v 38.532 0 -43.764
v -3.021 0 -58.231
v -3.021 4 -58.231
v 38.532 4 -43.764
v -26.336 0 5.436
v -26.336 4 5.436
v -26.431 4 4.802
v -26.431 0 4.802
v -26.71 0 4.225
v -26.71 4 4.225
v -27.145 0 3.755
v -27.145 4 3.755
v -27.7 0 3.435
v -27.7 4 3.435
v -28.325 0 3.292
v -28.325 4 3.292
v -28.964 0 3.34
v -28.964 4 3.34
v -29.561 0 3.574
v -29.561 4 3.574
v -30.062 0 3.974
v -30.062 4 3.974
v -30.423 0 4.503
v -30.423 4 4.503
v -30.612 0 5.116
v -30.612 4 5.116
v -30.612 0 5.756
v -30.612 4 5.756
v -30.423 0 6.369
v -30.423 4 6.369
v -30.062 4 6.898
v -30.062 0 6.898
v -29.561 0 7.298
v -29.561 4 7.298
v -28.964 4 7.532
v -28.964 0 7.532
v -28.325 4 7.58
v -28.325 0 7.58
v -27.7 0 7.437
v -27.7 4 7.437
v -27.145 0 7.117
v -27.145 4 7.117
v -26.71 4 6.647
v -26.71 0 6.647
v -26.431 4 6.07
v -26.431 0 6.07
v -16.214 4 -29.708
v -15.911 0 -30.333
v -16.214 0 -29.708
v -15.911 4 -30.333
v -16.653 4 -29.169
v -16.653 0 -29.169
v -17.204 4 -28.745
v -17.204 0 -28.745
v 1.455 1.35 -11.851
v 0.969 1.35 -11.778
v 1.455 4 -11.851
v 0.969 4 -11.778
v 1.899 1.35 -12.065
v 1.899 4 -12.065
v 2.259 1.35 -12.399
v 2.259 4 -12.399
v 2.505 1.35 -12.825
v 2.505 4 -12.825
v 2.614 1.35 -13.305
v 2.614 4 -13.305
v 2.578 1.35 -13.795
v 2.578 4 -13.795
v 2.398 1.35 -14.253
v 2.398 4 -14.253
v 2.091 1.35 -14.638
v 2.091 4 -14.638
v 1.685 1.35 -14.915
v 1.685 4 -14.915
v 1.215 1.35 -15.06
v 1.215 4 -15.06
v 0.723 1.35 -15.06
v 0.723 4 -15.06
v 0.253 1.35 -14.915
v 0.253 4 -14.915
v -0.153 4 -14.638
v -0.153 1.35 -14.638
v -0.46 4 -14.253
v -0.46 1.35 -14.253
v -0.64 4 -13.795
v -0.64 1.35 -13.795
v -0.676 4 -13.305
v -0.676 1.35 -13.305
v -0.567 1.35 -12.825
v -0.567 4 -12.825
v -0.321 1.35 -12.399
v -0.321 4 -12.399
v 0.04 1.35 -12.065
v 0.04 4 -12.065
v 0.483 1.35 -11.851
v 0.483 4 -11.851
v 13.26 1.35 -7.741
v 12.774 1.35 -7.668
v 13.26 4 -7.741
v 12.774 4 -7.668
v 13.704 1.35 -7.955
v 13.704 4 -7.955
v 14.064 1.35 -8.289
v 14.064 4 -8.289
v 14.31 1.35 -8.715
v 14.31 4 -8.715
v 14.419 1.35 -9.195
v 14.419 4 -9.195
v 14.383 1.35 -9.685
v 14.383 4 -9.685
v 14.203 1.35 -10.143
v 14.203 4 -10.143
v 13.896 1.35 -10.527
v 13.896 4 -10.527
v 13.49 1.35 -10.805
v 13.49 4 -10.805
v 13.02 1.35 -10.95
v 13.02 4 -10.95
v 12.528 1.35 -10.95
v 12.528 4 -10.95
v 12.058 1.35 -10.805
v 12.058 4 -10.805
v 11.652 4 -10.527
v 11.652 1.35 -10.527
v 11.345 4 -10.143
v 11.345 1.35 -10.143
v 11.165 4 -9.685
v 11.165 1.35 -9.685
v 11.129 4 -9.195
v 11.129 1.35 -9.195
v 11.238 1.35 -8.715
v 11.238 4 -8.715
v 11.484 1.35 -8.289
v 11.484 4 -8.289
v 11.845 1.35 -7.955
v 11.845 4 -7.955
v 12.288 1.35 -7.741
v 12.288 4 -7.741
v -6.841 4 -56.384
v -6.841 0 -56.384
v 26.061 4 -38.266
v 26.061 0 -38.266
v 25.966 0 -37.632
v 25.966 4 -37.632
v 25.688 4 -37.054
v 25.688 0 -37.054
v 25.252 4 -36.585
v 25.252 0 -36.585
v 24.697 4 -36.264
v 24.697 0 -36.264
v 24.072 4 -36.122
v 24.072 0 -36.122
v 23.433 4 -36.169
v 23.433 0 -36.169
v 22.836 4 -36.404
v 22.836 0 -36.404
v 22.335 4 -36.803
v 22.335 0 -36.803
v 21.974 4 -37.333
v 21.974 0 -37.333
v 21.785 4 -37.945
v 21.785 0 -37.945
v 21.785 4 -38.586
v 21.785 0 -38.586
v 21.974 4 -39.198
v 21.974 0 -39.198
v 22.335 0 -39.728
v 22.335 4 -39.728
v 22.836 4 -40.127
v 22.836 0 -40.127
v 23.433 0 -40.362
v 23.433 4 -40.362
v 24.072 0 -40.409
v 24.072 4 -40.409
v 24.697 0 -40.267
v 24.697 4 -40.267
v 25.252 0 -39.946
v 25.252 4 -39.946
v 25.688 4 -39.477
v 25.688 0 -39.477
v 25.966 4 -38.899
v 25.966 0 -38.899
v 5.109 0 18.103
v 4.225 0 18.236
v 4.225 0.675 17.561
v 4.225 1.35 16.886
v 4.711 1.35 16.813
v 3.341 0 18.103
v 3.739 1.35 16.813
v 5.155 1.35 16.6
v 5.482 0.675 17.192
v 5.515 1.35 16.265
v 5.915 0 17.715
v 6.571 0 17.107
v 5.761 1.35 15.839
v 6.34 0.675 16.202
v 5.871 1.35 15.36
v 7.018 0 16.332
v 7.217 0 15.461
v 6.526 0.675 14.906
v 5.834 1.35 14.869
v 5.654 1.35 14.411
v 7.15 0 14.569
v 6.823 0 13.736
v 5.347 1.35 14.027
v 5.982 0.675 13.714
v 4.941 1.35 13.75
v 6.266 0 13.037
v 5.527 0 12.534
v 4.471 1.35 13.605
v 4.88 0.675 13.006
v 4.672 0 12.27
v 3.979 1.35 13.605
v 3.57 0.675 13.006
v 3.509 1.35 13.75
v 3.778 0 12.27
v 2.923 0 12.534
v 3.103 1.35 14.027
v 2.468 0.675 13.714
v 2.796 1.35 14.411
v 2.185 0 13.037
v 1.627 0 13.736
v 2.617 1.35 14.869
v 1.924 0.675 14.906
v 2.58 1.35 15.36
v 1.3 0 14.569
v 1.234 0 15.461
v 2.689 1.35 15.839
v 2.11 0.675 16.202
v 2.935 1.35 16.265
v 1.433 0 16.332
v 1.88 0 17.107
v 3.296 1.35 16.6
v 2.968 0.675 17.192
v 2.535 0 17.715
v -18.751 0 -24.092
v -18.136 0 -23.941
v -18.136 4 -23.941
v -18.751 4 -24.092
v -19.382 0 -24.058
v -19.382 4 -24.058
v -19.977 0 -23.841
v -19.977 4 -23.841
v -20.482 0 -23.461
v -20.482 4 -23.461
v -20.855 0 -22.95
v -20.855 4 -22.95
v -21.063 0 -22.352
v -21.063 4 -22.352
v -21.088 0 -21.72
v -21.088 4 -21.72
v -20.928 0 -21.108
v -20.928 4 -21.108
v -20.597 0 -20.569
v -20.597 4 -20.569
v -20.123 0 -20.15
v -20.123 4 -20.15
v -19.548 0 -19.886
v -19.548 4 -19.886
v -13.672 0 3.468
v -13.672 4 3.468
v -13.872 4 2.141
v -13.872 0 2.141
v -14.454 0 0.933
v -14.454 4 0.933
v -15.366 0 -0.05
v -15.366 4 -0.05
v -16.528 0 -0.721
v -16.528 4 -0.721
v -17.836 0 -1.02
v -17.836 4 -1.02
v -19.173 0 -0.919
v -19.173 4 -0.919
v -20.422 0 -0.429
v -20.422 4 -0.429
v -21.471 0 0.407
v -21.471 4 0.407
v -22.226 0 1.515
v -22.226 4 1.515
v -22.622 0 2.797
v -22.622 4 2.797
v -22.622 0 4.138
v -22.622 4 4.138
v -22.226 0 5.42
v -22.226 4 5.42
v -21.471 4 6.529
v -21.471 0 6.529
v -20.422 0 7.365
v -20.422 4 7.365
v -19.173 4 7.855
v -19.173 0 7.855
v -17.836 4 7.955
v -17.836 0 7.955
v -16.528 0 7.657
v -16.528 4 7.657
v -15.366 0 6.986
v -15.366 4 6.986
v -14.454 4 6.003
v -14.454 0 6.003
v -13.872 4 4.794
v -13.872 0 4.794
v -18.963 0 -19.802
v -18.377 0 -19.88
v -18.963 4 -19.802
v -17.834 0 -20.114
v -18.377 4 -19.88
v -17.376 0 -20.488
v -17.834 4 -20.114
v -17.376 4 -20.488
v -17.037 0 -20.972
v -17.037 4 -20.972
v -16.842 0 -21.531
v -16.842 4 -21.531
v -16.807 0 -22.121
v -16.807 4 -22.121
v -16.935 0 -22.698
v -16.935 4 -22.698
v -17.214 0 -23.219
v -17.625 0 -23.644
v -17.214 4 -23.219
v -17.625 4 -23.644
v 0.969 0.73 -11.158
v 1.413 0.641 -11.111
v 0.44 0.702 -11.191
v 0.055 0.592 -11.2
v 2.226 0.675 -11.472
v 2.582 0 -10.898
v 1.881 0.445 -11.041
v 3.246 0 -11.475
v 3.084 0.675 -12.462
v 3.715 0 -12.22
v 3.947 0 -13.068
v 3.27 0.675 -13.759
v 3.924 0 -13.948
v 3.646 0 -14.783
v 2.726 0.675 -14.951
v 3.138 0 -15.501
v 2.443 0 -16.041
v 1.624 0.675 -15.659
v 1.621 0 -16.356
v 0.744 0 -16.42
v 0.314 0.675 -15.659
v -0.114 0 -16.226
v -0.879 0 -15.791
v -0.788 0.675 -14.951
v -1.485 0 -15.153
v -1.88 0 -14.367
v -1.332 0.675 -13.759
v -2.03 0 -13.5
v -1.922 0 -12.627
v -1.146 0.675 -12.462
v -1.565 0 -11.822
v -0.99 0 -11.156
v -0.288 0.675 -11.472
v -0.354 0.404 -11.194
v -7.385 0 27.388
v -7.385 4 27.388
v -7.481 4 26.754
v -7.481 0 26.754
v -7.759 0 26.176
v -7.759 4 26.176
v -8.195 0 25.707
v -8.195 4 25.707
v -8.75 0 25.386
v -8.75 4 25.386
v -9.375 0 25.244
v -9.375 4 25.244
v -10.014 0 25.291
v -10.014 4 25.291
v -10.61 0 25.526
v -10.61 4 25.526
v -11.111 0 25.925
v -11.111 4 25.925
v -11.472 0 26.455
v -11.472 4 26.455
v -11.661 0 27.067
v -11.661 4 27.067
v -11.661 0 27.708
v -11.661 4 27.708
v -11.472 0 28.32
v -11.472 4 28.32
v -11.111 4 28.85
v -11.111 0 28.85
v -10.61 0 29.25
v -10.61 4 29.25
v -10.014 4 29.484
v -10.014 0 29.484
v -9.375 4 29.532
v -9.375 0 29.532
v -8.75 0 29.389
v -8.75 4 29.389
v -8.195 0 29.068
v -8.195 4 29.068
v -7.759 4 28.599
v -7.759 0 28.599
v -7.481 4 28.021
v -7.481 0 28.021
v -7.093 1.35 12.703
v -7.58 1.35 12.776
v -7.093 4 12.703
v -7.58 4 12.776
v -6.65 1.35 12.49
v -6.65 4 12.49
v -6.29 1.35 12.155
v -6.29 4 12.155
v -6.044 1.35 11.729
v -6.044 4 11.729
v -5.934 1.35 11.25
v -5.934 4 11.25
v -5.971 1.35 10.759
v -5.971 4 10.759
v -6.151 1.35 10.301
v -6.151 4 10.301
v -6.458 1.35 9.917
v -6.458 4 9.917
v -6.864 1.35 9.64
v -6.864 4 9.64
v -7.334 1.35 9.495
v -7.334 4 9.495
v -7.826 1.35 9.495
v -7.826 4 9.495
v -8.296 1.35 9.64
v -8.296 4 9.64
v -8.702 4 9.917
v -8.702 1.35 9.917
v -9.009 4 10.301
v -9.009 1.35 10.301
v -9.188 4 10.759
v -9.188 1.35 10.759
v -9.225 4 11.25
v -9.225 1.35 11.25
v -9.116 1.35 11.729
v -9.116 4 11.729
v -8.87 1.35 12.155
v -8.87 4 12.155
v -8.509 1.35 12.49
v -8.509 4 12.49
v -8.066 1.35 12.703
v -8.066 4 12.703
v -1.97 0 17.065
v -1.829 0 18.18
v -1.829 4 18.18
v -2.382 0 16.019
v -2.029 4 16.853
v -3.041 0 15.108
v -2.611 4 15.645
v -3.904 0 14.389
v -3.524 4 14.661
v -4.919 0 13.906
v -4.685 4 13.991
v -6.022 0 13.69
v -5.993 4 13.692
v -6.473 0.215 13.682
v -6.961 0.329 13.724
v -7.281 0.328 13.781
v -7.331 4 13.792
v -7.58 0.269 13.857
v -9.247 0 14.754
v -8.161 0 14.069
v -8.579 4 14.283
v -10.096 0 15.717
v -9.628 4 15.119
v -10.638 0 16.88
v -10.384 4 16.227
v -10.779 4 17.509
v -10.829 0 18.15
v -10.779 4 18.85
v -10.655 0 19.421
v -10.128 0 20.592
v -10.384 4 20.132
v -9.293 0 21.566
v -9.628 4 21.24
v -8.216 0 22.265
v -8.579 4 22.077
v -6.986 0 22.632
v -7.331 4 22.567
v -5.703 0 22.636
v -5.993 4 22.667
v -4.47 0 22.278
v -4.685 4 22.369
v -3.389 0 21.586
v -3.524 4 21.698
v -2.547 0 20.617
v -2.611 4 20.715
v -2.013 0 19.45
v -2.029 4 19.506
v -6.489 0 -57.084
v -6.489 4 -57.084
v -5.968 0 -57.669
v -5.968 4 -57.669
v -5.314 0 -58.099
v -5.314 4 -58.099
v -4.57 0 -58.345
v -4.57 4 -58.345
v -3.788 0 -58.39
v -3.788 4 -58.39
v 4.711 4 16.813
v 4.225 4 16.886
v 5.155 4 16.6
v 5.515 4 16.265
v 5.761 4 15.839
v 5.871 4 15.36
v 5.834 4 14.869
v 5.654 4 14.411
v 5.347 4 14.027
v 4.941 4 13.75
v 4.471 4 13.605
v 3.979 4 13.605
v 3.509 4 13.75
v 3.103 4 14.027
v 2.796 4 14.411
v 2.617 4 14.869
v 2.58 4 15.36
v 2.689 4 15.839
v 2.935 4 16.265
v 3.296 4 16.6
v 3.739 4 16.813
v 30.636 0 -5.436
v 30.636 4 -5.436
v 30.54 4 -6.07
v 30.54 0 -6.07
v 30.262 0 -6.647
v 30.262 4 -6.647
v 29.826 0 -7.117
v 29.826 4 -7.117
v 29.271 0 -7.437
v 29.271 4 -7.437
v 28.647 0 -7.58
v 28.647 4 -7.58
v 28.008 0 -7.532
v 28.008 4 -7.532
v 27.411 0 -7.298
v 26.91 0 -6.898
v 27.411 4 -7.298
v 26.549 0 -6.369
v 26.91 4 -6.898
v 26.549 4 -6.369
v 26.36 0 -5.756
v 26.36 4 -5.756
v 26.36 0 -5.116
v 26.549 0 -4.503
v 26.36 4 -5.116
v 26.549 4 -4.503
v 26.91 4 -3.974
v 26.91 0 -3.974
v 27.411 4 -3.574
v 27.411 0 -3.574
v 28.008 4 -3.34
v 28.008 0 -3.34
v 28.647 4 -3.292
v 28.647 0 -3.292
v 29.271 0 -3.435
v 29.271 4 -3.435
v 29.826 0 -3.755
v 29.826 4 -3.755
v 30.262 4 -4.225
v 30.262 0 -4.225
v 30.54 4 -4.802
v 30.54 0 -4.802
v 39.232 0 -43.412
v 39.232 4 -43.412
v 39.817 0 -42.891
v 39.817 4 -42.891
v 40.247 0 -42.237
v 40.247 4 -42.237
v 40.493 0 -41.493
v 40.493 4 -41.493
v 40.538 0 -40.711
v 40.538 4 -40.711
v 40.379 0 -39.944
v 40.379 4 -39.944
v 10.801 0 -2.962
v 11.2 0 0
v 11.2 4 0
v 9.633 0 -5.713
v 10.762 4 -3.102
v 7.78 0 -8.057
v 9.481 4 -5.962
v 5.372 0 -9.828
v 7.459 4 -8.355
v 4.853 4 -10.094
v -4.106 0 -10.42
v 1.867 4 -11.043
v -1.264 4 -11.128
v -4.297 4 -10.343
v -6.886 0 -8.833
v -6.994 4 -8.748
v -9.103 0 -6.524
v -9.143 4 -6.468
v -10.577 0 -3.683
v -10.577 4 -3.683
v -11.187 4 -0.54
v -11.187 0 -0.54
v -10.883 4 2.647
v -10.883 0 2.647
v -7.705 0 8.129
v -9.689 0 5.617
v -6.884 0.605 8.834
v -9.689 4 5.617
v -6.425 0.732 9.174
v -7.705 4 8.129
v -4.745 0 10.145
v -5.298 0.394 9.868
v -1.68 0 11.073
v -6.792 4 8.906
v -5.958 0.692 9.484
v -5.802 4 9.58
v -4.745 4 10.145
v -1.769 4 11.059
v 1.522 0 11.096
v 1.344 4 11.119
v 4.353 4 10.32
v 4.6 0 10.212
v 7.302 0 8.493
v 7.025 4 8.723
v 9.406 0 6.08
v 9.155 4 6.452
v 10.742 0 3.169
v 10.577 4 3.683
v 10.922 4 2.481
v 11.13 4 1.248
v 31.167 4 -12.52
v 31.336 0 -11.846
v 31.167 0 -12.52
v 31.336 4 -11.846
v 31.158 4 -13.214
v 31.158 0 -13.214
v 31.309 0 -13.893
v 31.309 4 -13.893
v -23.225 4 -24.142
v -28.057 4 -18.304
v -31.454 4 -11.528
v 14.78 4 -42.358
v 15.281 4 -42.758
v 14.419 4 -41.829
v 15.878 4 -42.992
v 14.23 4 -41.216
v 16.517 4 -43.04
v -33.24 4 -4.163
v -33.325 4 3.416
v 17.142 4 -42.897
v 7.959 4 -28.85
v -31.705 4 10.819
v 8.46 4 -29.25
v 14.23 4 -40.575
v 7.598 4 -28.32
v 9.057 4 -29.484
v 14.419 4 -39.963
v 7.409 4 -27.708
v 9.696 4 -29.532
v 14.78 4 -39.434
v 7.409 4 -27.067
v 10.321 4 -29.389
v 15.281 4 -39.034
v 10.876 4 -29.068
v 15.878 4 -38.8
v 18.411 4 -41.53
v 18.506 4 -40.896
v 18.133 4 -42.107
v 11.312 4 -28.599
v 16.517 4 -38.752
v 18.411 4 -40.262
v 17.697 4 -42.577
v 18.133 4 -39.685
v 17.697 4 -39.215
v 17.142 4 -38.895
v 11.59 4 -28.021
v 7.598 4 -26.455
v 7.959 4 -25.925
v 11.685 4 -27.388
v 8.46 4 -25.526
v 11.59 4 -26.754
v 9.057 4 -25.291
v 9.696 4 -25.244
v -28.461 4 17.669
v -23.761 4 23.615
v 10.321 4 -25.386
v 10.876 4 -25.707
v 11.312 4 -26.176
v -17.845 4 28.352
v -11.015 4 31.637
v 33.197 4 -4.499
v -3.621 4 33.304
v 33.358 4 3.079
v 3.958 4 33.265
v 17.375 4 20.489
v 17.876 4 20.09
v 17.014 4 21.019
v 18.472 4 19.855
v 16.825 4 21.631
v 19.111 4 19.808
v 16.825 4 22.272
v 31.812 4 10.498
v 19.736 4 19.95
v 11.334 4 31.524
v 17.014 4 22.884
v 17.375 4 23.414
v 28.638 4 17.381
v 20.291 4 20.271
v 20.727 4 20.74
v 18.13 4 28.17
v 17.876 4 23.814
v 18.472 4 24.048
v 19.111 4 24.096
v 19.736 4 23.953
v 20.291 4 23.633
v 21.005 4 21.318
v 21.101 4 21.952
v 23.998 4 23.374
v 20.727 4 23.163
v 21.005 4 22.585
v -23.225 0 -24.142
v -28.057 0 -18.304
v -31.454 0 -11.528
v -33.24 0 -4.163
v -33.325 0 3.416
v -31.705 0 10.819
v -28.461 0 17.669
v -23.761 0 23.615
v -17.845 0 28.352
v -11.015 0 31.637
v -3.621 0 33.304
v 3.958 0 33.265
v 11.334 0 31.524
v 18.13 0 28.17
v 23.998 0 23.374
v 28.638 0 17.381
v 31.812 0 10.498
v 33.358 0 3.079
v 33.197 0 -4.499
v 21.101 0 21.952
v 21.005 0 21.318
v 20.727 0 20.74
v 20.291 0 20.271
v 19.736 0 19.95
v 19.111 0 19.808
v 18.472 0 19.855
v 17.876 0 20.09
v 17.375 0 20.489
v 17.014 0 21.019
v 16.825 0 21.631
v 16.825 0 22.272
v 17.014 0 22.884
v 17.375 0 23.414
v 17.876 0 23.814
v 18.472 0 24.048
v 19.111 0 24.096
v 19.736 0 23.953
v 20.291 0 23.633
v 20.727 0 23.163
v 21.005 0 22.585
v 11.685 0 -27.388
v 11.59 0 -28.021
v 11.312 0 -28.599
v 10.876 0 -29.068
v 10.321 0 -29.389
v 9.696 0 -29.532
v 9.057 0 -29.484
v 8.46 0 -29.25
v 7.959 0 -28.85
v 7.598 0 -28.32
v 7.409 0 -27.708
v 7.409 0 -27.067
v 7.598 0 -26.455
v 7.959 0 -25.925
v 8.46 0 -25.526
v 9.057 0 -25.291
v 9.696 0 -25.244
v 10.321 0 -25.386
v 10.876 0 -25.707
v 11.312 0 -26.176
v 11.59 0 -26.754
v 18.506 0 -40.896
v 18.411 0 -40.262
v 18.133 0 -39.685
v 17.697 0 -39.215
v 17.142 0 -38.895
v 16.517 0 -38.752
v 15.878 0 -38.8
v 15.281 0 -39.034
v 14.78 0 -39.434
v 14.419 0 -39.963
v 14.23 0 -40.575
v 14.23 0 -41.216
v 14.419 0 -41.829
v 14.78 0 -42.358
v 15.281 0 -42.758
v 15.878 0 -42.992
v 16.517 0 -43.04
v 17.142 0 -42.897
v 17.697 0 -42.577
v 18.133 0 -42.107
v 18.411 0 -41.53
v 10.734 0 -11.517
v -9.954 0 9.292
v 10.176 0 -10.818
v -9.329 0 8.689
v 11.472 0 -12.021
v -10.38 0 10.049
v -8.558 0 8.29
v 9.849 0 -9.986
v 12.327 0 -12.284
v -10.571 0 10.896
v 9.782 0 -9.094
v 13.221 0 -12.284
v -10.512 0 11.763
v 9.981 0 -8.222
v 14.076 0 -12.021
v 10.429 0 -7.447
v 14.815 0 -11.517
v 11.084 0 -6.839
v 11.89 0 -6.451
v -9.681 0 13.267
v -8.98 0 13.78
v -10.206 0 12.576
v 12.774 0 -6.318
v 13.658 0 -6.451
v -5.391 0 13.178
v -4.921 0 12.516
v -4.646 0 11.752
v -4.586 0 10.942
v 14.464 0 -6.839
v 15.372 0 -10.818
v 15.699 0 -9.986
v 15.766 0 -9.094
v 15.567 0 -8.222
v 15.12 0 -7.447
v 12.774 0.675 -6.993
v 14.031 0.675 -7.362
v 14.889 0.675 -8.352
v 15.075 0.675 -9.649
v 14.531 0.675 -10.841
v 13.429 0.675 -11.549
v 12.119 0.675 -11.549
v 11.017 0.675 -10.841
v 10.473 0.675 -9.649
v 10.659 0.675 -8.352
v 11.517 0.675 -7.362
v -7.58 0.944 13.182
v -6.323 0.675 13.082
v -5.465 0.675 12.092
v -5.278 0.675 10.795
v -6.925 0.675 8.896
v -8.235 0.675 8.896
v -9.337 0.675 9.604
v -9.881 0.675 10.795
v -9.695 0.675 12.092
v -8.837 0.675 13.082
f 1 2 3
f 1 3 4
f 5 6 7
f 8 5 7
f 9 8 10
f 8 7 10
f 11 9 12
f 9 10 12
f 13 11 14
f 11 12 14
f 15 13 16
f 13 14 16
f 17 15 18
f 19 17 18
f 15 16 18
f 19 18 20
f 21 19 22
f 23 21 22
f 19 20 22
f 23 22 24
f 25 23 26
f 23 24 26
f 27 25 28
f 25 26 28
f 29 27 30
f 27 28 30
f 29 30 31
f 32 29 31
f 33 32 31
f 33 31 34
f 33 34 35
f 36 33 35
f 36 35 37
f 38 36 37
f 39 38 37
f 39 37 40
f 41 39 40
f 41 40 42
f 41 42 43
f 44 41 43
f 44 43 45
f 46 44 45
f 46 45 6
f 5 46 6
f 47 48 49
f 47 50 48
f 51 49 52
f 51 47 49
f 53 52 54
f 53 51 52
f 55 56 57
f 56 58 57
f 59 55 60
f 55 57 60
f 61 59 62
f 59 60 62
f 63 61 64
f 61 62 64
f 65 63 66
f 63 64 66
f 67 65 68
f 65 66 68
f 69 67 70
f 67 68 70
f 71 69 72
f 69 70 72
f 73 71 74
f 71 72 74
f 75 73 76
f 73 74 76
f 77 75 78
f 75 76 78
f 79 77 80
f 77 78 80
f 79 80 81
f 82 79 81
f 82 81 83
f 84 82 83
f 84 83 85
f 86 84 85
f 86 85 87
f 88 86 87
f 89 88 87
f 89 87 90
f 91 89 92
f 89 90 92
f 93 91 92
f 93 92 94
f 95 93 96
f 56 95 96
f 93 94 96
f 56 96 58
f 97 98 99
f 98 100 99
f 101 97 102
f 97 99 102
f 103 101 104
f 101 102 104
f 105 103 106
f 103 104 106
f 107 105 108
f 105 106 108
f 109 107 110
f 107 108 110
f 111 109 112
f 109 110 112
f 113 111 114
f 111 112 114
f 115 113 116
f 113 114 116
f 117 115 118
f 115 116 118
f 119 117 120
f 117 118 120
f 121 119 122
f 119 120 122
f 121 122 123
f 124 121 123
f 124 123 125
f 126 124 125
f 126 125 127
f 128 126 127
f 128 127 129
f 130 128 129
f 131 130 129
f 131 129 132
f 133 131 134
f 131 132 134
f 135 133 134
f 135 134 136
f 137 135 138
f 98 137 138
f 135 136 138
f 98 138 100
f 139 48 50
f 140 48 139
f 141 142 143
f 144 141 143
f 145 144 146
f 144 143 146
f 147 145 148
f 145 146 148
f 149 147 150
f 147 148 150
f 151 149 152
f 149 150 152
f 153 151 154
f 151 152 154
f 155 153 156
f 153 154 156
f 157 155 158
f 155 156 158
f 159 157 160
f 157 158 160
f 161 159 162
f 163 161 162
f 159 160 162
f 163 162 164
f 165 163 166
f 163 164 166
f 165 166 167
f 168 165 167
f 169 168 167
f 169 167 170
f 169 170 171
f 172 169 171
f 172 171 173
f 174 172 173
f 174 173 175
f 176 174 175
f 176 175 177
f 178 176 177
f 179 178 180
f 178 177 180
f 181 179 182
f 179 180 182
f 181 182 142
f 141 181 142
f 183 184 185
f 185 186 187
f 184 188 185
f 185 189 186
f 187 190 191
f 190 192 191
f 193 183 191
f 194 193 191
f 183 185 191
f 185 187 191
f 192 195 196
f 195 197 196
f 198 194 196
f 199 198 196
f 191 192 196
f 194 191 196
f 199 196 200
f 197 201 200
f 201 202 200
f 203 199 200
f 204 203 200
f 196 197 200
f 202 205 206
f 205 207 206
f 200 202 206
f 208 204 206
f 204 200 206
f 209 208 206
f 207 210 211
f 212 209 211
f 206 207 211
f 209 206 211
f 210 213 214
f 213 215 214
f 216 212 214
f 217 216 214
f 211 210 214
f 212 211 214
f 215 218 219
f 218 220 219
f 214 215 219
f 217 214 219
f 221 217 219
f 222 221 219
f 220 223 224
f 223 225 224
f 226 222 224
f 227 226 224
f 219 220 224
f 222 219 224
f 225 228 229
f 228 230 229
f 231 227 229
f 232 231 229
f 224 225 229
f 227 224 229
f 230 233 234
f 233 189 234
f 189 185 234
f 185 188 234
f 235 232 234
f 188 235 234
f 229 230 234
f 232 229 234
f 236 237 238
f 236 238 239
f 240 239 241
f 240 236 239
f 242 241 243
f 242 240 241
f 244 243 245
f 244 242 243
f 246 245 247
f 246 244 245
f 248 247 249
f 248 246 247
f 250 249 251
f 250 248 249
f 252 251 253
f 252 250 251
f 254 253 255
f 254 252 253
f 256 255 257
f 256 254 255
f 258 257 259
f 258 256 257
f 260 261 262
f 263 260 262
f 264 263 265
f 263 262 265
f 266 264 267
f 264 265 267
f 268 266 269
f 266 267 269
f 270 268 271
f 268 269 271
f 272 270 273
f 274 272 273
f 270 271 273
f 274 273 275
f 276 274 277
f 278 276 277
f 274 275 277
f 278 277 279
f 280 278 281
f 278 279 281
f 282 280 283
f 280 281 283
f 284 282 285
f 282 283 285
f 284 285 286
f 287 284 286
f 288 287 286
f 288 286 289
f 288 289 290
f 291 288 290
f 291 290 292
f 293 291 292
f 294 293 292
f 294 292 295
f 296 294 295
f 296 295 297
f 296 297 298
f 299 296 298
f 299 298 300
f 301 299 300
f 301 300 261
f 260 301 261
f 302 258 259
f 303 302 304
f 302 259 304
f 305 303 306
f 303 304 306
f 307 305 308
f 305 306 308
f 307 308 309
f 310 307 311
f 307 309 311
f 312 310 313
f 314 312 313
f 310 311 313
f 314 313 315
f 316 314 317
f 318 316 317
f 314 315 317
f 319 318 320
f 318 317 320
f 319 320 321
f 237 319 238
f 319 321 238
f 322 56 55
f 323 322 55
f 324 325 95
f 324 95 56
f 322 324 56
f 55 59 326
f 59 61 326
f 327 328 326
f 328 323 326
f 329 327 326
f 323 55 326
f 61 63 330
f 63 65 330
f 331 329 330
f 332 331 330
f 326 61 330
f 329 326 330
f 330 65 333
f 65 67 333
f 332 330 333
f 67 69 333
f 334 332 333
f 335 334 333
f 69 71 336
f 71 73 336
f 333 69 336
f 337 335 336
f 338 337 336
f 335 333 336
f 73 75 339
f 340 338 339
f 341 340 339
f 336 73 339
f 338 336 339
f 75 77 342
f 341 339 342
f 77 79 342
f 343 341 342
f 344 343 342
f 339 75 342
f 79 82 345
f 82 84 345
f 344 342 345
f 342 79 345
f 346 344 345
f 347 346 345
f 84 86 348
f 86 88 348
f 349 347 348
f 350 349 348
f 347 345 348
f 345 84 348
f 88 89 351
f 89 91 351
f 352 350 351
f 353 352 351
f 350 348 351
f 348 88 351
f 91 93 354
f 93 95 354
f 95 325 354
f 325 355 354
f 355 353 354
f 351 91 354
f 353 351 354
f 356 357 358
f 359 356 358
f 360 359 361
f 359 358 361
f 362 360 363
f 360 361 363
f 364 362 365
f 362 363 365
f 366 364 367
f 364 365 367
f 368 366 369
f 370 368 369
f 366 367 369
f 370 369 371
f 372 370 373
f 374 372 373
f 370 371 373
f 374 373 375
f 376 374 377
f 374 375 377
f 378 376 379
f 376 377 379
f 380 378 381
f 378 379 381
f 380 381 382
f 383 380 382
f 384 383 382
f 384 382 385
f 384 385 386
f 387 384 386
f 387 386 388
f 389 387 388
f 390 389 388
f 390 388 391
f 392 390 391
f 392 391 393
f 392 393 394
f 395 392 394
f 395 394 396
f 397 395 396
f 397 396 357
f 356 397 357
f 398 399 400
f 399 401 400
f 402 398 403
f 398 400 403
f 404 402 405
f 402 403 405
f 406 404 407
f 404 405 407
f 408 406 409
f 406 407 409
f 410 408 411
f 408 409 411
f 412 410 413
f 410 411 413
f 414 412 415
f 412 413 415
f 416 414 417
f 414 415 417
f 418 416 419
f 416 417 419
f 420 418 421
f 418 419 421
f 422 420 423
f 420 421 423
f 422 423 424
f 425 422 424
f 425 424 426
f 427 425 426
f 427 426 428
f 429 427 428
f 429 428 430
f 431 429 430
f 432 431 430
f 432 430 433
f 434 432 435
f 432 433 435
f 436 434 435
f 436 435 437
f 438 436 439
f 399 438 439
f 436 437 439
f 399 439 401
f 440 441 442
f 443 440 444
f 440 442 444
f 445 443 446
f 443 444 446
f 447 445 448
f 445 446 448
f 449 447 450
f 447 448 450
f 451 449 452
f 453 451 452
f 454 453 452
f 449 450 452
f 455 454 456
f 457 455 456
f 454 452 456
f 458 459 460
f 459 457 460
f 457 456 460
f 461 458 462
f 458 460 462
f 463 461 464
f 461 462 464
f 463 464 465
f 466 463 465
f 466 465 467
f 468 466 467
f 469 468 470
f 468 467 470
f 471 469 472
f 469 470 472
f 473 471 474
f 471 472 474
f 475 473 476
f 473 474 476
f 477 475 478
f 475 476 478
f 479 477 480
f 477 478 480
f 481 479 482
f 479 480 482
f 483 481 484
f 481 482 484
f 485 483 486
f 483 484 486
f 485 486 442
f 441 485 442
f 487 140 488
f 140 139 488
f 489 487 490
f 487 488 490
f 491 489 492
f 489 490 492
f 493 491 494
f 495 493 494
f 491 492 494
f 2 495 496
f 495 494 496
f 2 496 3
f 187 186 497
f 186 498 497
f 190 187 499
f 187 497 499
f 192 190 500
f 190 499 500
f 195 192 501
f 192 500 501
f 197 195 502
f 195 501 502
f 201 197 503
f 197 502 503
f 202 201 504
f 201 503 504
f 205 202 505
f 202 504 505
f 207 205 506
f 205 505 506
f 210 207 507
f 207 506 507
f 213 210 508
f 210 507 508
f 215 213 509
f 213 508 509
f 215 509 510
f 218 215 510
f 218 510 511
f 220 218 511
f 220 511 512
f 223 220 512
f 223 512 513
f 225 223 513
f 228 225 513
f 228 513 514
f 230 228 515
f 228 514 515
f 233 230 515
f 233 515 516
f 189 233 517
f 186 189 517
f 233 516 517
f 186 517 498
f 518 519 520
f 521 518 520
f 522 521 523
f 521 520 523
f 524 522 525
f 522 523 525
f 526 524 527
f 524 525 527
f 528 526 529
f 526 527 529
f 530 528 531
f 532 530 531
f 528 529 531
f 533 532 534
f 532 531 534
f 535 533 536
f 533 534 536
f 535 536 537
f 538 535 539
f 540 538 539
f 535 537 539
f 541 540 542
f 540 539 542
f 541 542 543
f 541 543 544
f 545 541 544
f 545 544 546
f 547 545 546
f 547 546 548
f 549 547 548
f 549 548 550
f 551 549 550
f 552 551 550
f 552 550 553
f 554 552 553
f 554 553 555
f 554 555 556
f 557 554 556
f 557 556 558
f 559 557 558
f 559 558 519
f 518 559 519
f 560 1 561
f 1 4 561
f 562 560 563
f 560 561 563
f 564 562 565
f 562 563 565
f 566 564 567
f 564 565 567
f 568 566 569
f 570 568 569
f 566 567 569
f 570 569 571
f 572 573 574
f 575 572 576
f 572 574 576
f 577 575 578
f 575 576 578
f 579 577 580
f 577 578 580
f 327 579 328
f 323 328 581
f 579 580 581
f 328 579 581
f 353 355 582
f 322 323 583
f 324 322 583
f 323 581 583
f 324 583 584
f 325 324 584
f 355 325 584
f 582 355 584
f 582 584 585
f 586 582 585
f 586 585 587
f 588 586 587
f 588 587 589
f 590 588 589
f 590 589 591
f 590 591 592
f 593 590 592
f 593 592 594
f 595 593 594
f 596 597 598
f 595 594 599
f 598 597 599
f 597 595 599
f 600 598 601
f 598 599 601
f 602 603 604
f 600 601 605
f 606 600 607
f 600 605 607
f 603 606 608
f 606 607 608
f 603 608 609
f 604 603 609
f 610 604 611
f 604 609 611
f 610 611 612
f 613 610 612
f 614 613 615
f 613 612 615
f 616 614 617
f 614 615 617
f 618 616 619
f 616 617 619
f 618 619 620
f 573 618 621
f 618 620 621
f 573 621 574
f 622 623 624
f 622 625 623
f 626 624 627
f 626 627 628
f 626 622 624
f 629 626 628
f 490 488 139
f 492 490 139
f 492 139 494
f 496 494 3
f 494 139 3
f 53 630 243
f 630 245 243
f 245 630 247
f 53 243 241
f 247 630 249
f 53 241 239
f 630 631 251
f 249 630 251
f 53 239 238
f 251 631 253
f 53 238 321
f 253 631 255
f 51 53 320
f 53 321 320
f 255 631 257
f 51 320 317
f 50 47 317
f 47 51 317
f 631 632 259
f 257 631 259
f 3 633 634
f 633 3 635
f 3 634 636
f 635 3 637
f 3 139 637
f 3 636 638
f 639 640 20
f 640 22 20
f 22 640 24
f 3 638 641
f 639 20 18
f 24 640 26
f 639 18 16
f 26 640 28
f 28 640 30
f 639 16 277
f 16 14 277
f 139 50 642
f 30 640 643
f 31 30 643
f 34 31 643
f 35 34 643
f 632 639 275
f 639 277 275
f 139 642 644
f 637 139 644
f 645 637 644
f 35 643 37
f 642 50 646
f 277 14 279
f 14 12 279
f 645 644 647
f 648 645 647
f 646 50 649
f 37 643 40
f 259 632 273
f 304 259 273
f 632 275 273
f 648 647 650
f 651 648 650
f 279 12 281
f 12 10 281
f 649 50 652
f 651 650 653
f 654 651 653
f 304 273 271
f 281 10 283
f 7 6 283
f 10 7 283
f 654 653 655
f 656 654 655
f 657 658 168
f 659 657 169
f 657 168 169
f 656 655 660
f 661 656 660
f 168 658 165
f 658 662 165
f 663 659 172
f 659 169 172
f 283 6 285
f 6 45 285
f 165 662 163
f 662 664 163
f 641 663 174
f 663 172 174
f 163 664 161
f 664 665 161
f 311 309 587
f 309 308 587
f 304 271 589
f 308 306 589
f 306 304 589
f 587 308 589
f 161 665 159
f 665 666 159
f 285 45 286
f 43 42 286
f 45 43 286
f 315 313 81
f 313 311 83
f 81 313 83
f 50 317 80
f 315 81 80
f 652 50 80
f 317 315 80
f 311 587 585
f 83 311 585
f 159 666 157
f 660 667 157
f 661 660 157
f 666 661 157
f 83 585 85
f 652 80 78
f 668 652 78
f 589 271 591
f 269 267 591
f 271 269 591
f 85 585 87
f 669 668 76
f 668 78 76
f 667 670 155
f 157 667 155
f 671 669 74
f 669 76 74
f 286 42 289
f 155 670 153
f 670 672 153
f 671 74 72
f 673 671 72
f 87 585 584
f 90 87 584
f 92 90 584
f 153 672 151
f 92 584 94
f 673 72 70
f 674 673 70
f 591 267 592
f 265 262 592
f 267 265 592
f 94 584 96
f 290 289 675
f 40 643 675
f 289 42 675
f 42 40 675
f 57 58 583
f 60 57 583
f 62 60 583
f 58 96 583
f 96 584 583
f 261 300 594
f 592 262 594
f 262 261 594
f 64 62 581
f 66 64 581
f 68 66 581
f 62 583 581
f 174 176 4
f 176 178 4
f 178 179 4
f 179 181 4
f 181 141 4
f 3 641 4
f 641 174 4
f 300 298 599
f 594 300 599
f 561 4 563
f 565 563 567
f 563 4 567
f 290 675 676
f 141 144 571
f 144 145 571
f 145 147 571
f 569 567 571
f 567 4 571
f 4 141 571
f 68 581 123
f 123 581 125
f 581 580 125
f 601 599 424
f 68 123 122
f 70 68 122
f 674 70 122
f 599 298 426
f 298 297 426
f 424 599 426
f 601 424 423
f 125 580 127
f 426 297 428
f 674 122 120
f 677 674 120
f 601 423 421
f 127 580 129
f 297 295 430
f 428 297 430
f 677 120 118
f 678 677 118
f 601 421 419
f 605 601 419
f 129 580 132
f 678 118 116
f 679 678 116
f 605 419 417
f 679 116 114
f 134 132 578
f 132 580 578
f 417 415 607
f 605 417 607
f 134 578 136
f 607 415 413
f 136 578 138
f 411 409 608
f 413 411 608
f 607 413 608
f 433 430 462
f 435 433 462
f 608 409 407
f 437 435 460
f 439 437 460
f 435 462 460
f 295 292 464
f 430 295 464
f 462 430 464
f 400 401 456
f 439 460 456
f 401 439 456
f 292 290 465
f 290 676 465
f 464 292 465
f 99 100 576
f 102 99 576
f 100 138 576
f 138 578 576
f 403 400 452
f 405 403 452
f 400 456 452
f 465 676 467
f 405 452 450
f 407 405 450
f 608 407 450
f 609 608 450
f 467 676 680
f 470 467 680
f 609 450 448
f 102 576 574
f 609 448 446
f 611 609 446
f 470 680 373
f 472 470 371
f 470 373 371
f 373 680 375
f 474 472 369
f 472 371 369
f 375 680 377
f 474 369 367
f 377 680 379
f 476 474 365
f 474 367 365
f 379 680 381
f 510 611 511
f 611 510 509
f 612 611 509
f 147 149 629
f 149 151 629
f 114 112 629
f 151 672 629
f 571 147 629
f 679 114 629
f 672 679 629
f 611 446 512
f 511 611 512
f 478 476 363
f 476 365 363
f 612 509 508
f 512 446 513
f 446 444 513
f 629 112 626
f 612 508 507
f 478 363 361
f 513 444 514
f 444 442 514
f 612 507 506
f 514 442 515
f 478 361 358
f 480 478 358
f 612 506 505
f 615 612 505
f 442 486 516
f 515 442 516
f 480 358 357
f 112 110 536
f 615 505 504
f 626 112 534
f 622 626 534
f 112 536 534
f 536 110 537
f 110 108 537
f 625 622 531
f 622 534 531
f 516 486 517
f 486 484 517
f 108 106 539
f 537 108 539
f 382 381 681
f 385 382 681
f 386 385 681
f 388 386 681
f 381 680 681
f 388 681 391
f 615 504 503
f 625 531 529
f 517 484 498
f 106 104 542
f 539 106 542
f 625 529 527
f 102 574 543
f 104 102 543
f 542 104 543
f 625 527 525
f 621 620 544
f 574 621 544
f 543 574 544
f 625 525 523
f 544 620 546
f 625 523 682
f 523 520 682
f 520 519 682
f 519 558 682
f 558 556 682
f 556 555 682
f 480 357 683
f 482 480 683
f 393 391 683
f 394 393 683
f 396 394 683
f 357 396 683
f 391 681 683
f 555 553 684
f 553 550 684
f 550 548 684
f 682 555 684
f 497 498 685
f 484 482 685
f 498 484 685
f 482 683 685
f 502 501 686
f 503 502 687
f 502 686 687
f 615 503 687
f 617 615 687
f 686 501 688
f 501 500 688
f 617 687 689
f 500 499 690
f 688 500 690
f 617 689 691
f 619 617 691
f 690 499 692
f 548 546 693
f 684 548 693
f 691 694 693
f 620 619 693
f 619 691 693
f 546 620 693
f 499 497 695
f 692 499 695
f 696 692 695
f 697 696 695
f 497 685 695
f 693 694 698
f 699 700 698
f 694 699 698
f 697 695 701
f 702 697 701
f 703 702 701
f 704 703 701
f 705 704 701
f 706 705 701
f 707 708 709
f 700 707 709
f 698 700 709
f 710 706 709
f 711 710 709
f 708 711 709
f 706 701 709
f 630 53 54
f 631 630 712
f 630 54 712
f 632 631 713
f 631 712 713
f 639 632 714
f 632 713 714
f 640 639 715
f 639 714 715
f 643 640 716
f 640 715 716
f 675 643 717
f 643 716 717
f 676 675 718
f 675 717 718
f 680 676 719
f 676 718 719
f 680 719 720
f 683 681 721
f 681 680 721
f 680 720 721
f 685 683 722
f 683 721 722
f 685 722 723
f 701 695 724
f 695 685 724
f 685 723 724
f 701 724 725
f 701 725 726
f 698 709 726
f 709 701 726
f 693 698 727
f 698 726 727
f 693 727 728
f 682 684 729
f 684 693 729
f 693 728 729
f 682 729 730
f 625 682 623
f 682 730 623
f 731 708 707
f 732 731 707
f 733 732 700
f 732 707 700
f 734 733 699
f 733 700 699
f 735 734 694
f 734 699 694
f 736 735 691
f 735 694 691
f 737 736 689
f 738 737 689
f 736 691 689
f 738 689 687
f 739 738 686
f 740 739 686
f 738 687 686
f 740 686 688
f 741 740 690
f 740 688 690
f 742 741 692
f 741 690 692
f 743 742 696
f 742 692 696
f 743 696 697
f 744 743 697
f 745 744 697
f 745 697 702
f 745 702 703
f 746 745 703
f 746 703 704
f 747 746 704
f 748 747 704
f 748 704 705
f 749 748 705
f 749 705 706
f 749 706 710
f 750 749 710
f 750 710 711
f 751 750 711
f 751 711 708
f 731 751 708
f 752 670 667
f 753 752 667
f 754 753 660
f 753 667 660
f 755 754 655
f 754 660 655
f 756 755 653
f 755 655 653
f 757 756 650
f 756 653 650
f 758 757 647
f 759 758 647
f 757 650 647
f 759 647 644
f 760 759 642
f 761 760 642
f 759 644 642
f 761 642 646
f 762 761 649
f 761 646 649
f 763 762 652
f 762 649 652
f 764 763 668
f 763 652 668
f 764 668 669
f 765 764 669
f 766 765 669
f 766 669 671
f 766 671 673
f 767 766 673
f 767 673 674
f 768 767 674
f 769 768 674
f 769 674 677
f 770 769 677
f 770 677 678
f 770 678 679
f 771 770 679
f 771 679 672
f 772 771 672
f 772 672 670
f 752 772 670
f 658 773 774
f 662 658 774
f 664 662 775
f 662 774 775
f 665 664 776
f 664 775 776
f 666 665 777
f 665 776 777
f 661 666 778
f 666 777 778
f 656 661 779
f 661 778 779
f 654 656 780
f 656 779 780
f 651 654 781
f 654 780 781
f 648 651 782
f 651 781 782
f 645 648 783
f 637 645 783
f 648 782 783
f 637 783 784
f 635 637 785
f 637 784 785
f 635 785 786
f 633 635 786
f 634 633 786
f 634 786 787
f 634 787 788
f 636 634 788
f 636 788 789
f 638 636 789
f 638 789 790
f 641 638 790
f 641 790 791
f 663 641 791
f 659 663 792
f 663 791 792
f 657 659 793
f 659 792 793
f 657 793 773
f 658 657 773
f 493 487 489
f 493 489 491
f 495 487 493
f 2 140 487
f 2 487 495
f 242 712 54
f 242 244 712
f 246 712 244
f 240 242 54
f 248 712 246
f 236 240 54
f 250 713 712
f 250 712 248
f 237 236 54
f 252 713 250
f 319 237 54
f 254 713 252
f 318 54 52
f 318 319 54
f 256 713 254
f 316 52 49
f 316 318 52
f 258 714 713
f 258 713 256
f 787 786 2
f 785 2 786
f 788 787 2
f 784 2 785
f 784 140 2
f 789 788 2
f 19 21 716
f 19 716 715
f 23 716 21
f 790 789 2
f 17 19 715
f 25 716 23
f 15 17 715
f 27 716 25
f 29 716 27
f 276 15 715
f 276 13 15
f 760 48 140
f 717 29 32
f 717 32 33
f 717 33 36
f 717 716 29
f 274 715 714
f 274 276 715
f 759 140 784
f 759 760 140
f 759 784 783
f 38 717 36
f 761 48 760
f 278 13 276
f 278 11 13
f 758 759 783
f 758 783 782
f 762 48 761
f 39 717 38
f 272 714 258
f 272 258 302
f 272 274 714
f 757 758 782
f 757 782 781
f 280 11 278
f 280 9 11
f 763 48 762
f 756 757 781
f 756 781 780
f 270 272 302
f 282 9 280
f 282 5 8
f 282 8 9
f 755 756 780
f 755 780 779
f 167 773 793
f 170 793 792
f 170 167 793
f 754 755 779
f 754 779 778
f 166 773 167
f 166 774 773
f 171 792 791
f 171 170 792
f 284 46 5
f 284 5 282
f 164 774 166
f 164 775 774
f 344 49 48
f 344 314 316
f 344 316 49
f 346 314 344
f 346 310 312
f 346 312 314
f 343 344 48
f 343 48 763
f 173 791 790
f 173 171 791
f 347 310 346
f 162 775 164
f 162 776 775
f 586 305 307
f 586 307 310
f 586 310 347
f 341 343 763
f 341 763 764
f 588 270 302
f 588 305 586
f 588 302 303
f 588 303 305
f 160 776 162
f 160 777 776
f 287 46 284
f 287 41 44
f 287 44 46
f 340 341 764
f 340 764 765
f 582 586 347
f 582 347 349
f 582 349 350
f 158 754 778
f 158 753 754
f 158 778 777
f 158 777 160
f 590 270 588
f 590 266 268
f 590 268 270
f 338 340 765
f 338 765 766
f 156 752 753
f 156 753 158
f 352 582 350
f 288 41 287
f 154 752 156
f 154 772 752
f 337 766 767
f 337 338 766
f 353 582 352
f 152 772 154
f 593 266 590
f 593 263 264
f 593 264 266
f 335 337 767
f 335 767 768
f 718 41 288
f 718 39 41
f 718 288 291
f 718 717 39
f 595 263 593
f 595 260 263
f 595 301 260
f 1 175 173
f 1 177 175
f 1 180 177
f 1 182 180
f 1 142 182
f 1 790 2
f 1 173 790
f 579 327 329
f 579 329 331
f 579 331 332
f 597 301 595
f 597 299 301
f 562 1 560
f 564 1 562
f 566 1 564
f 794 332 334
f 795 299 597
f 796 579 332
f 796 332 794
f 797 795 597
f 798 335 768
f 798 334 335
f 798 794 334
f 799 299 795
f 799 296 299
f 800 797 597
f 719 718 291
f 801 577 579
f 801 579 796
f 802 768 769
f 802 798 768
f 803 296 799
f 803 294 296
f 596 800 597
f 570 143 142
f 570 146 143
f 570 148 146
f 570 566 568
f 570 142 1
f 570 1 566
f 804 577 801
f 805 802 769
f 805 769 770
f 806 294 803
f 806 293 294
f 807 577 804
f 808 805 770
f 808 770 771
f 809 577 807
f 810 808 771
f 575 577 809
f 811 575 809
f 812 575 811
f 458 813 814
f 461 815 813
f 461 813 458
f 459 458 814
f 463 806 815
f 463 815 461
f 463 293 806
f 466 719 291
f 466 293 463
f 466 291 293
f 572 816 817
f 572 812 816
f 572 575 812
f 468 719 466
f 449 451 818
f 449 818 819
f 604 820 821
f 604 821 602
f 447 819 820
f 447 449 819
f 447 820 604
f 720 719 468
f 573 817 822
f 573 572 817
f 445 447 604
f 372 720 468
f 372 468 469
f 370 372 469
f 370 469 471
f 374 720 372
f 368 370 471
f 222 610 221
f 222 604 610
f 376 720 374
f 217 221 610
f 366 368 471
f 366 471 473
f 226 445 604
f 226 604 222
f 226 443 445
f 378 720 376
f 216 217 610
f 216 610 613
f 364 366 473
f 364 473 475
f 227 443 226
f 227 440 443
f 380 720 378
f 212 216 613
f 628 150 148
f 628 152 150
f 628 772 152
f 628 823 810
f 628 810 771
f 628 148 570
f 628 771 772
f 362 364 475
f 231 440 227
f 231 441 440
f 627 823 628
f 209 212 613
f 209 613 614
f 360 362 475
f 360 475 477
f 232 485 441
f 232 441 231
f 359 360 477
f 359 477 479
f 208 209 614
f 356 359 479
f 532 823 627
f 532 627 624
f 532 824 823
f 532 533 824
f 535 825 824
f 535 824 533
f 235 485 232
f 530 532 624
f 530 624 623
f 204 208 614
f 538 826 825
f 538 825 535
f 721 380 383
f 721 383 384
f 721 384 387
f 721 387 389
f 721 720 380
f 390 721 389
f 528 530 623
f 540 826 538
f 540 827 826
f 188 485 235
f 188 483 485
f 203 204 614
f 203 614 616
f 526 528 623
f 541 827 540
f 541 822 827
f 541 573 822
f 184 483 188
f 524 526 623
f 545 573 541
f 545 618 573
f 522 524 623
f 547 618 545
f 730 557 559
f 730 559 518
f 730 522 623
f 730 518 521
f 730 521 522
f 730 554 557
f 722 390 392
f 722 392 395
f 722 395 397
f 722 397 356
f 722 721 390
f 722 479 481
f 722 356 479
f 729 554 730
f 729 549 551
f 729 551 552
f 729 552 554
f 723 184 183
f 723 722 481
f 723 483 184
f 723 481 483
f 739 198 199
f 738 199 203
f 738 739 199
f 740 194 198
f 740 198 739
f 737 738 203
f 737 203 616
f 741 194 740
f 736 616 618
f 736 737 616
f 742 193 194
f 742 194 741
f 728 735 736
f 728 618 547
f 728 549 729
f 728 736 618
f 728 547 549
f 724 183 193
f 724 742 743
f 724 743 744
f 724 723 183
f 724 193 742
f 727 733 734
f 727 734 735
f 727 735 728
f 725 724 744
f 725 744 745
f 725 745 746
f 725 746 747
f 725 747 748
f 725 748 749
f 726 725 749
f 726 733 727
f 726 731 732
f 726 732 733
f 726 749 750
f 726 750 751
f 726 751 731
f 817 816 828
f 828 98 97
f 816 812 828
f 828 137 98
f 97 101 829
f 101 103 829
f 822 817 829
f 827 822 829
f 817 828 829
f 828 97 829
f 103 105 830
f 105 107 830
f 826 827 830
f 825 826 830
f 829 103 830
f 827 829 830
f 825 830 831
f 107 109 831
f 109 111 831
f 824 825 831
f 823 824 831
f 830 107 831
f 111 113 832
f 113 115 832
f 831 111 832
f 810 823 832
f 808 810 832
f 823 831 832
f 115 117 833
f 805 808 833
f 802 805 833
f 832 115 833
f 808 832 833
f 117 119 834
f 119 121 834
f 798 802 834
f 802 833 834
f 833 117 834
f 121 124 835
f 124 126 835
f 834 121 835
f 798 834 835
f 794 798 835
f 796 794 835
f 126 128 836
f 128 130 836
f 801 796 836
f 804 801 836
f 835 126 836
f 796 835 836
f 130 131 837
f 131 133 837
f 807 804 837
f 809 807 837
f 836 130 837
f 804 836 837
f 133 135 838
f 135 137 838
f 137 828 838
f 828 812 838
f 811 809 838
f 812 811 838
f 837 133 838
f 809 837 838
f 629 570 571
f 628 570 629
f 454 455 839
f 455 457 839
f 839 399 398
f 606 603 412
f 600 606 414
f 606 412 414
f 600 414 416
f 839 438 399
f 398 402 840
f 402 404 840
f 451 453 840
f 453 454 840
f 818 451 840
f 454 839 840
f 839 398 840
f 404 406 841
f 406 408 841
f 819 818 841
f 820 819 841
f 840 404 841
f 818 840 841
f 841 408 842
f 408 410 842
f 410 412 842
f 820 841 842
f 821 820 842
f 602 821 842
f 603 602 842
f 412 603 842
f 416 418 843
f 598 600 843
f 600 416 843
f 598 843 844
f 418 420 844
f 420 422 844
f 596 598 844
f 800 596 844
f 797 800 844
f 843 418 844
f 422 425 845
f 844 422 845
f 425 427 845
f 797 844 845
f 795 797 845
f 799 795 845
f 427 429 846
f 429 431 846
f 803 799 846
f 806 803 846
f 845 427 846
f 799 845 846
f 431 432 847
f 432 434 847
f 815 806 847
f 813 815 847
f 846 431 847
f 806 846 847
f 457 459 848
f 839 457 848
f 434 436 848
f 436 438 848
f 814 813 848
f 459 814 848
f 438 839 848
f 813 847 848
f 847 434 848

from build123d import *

# Parameters (mm, degrees)
SKETCH_1_R                = 33.5
EXTRUDE_1_DEPTH           = 4
SKETCH_2_R                = 2.15
CUT_EXTRUDE_1_DEPTH       = 24
SKETCH_3_R                = 4.5
CUT_EXTRUDE_2_DEPTH       = 5
SKETCH_4_R                = 11.2
CUT_EXTRUDE_3_DEPTH       = 5
HOLE_WIZARD_1_D           = 3.3
HOLE_WIZARD_1_CSINK_D     = 6
HOLE_WIZARD_1_CSINK_ANGLE = 90
SKETCH_9_R                = 2.15
SKETCH_9_R_2              = 4.5
SKETCH_9_R_3              = 3
EXTRUDE_2_DEPTH           = 4
SKETCH_10_R               = 2.15
CUT_EXTRUDE_4_DEPTH       = 4
FILLET_1_R                = 3


with BuildPart() as part:
    # 草图1 → 凸台-拉伸1 (new body)
    with BuildSketch(Plane(origin=(0, 0, 0), x_dir=(1, 0, 0), z_dir=(0, 1, 0))):
        Circle(SKETCH_1_R)
    extrude(amount=EXTRUDE_1_DEPTH)

    # 草图2 → 切除-拉伸1 (cut)
    with BuildSketch(Plane(origin=(0, 4, 0), x_dir=(1, 0, 0), z_dir=(0, 1, 0))):
        with Locations((-18.950679053, 21.951577698)):
            Circle(SKETCH_2_R)
        with Locations((9.535284413, 27.387558328)):
            Circle(SKETCH_2_R)
        with Locations((28.485963466, 5.43598063)):
            Circle(SKETCH_2_R)
        with Locations((18.950679053, -21.951577698)):
            Circle(SKETCH_2_R)
        with Locations((-9.535284413, -27.387558328)):
            Circle(SKETCH_2_R)
        with Locations((-28.485963466, -5.43598063)):
            Circle(SKETCH_2_R)
    extrude(amount=-CUT_EXTRUDE_1_DEPTH, mode=Mode.SUBTRACT)

    # 草图3 → 切除-拉伸2 (cut, through all)
    with BuildSketch(Plane(origin=(0, 4, 0), x_dir=(1, 0, 0), z_dir=(0, 1, 0))):
        with Locations((-18.172080142, -3.467780747)):
            Circle(SKETCH_3_R)
        with Locations((-6.329456033, -18.179672338)):
            Circle(SKETCH_3_R)
    extrude(amount=-CUT_EXTRUDE_2_DEPTH, mode=Mode.SUBTRACT)

    # 草图4 → 切除-拉伸3 (cut, through all)
    with BuildSketch(Plane(origin=(0, 4, 0), x_dir=(1, 0, 0), z_dir=(0, 1, 0))):
        Circle(SKETCH_4_R)
    extrude(amount=-CUT_EXTRUDE_3_DEPTH, mode=Mode.SUBTRACT)

    # 孔1 (through all)
    with Locations(Plane(origin=(12.774024908, 0, -9.317955122), x_dir=(0, 0, -1), z_dir=(0, -1, 0))):
        with Locations((0, 0), (4.110036385, -11.804982038), (-24.554362639, -8.548875681), (-20.444326254, -20.353857719)):
            CounterSinkHole(HOLE_WIZARD_1_D / 2, HOLE_WIZARD_1_CSINK_D / 2, counter_sink_angle=HOLE_WIZARD_1_CSINK_ANGLE)

    # 草图9 → 凸台-拉伸2 (add)
    with BuildSketch(Plane.XZ):
        with BuildLine():
            ThreePointArc((30.94197409, -12.839168175), (11.014897512, -31.637351862), (-16.277954062, -29.279313714))
            Line((-16.277954062, -29.279313714), (-5.854606893, -59.217595173))
            Line((-5.854606893, -59.217595173), (41.365321259, -42.777449634))
            Line((41.365321259, -42.777449634), (30.94197409, -12.839168175))
        make_face()
        with BuildLine():
            Line((-19.548240775, -19.886288375), (-23.609964076, -8.22007277))
            Line((-23.609964076, -8.22007277), (-10.577263906, -3.682592601))
            ThreePointArc((-10.577263906, -3.682592601), (-10.882752845, 2.646826497), (-7.704540242, 8.128964243))
            ThreePointArc((-7.704540242, 8.128964243), (-10.570999096, 10.896318406), (-8.161427671, 14.069455809))
            ThreePointArc((-8.161427671, 14.069455809), (-5.543963925, 22.610586708), (-6.021999809, 13.690187884))
            ThreePointArc((-6.021999809, 13.690187884), (-4.757437603, 12.143270974), (-4.744786266, 10.145294638))
            ThreePointArc((-4.744786266, 10.145294638), (4.352709301, 10.319589223), (10.577263906, 3.682592601))
            Line((10.577263906, 3.682592601), (23.609964076, 8.22007277))
            Line((23.609964076, 8.22007277), (27.671687377, -3.446142835))
            ThreePointArc((27.671687377, -3.446142835), (29.684255252, -3.650876488), (30.635963466, -5.43598063))
            ThreePointArc((30.635963466, -5.43598063), (30.204575944, -6.727828589), (29.083525188, -7.501269953))
            Line((29.083525188, -7.501269953), (30.94197409, -12.839168175))
            ThreePointArc((30.94197409, -12.839168175), (32.854270134, -6.545756946), (33.5, 0))
            ThreePointArc((33.5, 0), (-16.984383105, 28.875261566), (-16.277954062, -29.279313714))
            Line((-16.277954062, -29.279313714), (-18.136402964, -23.941415493))
            ThreePointArc((-18.136402964, -23.941415493), (-20.981135964, -22.658503956), (-19.548240775, -19.886288375))
        make_face()
        with Locations((-28.485963466, 5.43598063)):
            Circle(SKETCH_9_R, mode=Mode.SUBTRACT)
        with Locations((-18.172080142, 3.467780747)):
            Circle(SKETCH_9_R_2, mode=Mode.SUBTRACT)
        with Locations((-9.535284413, 27.387558328)):
            Circle(SKETCH_9_R, mode=Mode.SUBTRACT)
        with Locations((4.225149227, 15.236407517)):
            Circle(SKETCH_9_R_3, mode=Mode.SUBTRACT)
        with Locations((18.950679053, 21.951577698)):
            Circle(SKETCH_9_R, mode=Mode.SUBTRACT)
    extrude(amount=-EXTRUDE_2_DEPTH)

    # 草图10 → 切除-拉伸4 (cut)
    with BuildSketch(Plane.XZ):
        with Locations((16.356125201, -40.895930952)):
            Circle(SKETCH_10_R)
        with Locations((23.911313705, -38.265507665)):
            Circle(SKETCH_10_R)
    extrude(amount=-CUT_EXTRUDE_4_DEPTH, mode=Mode.SUBTRACT)

    # 圆角1
    fillet_1_edges = [part.edges().sort_by_distance(p)[0] for p in [
        (30.94197409, 2, -12.839168175),
        (-16.277954062, 2, -29.279313714),
        (-5.854606893, 2, -59.217595173),
        (41.365321259, 2, -42.777449634),
    ]]
    fillet(fillet_1_edges, radius=FILLET_1_R)


solid = part.part
